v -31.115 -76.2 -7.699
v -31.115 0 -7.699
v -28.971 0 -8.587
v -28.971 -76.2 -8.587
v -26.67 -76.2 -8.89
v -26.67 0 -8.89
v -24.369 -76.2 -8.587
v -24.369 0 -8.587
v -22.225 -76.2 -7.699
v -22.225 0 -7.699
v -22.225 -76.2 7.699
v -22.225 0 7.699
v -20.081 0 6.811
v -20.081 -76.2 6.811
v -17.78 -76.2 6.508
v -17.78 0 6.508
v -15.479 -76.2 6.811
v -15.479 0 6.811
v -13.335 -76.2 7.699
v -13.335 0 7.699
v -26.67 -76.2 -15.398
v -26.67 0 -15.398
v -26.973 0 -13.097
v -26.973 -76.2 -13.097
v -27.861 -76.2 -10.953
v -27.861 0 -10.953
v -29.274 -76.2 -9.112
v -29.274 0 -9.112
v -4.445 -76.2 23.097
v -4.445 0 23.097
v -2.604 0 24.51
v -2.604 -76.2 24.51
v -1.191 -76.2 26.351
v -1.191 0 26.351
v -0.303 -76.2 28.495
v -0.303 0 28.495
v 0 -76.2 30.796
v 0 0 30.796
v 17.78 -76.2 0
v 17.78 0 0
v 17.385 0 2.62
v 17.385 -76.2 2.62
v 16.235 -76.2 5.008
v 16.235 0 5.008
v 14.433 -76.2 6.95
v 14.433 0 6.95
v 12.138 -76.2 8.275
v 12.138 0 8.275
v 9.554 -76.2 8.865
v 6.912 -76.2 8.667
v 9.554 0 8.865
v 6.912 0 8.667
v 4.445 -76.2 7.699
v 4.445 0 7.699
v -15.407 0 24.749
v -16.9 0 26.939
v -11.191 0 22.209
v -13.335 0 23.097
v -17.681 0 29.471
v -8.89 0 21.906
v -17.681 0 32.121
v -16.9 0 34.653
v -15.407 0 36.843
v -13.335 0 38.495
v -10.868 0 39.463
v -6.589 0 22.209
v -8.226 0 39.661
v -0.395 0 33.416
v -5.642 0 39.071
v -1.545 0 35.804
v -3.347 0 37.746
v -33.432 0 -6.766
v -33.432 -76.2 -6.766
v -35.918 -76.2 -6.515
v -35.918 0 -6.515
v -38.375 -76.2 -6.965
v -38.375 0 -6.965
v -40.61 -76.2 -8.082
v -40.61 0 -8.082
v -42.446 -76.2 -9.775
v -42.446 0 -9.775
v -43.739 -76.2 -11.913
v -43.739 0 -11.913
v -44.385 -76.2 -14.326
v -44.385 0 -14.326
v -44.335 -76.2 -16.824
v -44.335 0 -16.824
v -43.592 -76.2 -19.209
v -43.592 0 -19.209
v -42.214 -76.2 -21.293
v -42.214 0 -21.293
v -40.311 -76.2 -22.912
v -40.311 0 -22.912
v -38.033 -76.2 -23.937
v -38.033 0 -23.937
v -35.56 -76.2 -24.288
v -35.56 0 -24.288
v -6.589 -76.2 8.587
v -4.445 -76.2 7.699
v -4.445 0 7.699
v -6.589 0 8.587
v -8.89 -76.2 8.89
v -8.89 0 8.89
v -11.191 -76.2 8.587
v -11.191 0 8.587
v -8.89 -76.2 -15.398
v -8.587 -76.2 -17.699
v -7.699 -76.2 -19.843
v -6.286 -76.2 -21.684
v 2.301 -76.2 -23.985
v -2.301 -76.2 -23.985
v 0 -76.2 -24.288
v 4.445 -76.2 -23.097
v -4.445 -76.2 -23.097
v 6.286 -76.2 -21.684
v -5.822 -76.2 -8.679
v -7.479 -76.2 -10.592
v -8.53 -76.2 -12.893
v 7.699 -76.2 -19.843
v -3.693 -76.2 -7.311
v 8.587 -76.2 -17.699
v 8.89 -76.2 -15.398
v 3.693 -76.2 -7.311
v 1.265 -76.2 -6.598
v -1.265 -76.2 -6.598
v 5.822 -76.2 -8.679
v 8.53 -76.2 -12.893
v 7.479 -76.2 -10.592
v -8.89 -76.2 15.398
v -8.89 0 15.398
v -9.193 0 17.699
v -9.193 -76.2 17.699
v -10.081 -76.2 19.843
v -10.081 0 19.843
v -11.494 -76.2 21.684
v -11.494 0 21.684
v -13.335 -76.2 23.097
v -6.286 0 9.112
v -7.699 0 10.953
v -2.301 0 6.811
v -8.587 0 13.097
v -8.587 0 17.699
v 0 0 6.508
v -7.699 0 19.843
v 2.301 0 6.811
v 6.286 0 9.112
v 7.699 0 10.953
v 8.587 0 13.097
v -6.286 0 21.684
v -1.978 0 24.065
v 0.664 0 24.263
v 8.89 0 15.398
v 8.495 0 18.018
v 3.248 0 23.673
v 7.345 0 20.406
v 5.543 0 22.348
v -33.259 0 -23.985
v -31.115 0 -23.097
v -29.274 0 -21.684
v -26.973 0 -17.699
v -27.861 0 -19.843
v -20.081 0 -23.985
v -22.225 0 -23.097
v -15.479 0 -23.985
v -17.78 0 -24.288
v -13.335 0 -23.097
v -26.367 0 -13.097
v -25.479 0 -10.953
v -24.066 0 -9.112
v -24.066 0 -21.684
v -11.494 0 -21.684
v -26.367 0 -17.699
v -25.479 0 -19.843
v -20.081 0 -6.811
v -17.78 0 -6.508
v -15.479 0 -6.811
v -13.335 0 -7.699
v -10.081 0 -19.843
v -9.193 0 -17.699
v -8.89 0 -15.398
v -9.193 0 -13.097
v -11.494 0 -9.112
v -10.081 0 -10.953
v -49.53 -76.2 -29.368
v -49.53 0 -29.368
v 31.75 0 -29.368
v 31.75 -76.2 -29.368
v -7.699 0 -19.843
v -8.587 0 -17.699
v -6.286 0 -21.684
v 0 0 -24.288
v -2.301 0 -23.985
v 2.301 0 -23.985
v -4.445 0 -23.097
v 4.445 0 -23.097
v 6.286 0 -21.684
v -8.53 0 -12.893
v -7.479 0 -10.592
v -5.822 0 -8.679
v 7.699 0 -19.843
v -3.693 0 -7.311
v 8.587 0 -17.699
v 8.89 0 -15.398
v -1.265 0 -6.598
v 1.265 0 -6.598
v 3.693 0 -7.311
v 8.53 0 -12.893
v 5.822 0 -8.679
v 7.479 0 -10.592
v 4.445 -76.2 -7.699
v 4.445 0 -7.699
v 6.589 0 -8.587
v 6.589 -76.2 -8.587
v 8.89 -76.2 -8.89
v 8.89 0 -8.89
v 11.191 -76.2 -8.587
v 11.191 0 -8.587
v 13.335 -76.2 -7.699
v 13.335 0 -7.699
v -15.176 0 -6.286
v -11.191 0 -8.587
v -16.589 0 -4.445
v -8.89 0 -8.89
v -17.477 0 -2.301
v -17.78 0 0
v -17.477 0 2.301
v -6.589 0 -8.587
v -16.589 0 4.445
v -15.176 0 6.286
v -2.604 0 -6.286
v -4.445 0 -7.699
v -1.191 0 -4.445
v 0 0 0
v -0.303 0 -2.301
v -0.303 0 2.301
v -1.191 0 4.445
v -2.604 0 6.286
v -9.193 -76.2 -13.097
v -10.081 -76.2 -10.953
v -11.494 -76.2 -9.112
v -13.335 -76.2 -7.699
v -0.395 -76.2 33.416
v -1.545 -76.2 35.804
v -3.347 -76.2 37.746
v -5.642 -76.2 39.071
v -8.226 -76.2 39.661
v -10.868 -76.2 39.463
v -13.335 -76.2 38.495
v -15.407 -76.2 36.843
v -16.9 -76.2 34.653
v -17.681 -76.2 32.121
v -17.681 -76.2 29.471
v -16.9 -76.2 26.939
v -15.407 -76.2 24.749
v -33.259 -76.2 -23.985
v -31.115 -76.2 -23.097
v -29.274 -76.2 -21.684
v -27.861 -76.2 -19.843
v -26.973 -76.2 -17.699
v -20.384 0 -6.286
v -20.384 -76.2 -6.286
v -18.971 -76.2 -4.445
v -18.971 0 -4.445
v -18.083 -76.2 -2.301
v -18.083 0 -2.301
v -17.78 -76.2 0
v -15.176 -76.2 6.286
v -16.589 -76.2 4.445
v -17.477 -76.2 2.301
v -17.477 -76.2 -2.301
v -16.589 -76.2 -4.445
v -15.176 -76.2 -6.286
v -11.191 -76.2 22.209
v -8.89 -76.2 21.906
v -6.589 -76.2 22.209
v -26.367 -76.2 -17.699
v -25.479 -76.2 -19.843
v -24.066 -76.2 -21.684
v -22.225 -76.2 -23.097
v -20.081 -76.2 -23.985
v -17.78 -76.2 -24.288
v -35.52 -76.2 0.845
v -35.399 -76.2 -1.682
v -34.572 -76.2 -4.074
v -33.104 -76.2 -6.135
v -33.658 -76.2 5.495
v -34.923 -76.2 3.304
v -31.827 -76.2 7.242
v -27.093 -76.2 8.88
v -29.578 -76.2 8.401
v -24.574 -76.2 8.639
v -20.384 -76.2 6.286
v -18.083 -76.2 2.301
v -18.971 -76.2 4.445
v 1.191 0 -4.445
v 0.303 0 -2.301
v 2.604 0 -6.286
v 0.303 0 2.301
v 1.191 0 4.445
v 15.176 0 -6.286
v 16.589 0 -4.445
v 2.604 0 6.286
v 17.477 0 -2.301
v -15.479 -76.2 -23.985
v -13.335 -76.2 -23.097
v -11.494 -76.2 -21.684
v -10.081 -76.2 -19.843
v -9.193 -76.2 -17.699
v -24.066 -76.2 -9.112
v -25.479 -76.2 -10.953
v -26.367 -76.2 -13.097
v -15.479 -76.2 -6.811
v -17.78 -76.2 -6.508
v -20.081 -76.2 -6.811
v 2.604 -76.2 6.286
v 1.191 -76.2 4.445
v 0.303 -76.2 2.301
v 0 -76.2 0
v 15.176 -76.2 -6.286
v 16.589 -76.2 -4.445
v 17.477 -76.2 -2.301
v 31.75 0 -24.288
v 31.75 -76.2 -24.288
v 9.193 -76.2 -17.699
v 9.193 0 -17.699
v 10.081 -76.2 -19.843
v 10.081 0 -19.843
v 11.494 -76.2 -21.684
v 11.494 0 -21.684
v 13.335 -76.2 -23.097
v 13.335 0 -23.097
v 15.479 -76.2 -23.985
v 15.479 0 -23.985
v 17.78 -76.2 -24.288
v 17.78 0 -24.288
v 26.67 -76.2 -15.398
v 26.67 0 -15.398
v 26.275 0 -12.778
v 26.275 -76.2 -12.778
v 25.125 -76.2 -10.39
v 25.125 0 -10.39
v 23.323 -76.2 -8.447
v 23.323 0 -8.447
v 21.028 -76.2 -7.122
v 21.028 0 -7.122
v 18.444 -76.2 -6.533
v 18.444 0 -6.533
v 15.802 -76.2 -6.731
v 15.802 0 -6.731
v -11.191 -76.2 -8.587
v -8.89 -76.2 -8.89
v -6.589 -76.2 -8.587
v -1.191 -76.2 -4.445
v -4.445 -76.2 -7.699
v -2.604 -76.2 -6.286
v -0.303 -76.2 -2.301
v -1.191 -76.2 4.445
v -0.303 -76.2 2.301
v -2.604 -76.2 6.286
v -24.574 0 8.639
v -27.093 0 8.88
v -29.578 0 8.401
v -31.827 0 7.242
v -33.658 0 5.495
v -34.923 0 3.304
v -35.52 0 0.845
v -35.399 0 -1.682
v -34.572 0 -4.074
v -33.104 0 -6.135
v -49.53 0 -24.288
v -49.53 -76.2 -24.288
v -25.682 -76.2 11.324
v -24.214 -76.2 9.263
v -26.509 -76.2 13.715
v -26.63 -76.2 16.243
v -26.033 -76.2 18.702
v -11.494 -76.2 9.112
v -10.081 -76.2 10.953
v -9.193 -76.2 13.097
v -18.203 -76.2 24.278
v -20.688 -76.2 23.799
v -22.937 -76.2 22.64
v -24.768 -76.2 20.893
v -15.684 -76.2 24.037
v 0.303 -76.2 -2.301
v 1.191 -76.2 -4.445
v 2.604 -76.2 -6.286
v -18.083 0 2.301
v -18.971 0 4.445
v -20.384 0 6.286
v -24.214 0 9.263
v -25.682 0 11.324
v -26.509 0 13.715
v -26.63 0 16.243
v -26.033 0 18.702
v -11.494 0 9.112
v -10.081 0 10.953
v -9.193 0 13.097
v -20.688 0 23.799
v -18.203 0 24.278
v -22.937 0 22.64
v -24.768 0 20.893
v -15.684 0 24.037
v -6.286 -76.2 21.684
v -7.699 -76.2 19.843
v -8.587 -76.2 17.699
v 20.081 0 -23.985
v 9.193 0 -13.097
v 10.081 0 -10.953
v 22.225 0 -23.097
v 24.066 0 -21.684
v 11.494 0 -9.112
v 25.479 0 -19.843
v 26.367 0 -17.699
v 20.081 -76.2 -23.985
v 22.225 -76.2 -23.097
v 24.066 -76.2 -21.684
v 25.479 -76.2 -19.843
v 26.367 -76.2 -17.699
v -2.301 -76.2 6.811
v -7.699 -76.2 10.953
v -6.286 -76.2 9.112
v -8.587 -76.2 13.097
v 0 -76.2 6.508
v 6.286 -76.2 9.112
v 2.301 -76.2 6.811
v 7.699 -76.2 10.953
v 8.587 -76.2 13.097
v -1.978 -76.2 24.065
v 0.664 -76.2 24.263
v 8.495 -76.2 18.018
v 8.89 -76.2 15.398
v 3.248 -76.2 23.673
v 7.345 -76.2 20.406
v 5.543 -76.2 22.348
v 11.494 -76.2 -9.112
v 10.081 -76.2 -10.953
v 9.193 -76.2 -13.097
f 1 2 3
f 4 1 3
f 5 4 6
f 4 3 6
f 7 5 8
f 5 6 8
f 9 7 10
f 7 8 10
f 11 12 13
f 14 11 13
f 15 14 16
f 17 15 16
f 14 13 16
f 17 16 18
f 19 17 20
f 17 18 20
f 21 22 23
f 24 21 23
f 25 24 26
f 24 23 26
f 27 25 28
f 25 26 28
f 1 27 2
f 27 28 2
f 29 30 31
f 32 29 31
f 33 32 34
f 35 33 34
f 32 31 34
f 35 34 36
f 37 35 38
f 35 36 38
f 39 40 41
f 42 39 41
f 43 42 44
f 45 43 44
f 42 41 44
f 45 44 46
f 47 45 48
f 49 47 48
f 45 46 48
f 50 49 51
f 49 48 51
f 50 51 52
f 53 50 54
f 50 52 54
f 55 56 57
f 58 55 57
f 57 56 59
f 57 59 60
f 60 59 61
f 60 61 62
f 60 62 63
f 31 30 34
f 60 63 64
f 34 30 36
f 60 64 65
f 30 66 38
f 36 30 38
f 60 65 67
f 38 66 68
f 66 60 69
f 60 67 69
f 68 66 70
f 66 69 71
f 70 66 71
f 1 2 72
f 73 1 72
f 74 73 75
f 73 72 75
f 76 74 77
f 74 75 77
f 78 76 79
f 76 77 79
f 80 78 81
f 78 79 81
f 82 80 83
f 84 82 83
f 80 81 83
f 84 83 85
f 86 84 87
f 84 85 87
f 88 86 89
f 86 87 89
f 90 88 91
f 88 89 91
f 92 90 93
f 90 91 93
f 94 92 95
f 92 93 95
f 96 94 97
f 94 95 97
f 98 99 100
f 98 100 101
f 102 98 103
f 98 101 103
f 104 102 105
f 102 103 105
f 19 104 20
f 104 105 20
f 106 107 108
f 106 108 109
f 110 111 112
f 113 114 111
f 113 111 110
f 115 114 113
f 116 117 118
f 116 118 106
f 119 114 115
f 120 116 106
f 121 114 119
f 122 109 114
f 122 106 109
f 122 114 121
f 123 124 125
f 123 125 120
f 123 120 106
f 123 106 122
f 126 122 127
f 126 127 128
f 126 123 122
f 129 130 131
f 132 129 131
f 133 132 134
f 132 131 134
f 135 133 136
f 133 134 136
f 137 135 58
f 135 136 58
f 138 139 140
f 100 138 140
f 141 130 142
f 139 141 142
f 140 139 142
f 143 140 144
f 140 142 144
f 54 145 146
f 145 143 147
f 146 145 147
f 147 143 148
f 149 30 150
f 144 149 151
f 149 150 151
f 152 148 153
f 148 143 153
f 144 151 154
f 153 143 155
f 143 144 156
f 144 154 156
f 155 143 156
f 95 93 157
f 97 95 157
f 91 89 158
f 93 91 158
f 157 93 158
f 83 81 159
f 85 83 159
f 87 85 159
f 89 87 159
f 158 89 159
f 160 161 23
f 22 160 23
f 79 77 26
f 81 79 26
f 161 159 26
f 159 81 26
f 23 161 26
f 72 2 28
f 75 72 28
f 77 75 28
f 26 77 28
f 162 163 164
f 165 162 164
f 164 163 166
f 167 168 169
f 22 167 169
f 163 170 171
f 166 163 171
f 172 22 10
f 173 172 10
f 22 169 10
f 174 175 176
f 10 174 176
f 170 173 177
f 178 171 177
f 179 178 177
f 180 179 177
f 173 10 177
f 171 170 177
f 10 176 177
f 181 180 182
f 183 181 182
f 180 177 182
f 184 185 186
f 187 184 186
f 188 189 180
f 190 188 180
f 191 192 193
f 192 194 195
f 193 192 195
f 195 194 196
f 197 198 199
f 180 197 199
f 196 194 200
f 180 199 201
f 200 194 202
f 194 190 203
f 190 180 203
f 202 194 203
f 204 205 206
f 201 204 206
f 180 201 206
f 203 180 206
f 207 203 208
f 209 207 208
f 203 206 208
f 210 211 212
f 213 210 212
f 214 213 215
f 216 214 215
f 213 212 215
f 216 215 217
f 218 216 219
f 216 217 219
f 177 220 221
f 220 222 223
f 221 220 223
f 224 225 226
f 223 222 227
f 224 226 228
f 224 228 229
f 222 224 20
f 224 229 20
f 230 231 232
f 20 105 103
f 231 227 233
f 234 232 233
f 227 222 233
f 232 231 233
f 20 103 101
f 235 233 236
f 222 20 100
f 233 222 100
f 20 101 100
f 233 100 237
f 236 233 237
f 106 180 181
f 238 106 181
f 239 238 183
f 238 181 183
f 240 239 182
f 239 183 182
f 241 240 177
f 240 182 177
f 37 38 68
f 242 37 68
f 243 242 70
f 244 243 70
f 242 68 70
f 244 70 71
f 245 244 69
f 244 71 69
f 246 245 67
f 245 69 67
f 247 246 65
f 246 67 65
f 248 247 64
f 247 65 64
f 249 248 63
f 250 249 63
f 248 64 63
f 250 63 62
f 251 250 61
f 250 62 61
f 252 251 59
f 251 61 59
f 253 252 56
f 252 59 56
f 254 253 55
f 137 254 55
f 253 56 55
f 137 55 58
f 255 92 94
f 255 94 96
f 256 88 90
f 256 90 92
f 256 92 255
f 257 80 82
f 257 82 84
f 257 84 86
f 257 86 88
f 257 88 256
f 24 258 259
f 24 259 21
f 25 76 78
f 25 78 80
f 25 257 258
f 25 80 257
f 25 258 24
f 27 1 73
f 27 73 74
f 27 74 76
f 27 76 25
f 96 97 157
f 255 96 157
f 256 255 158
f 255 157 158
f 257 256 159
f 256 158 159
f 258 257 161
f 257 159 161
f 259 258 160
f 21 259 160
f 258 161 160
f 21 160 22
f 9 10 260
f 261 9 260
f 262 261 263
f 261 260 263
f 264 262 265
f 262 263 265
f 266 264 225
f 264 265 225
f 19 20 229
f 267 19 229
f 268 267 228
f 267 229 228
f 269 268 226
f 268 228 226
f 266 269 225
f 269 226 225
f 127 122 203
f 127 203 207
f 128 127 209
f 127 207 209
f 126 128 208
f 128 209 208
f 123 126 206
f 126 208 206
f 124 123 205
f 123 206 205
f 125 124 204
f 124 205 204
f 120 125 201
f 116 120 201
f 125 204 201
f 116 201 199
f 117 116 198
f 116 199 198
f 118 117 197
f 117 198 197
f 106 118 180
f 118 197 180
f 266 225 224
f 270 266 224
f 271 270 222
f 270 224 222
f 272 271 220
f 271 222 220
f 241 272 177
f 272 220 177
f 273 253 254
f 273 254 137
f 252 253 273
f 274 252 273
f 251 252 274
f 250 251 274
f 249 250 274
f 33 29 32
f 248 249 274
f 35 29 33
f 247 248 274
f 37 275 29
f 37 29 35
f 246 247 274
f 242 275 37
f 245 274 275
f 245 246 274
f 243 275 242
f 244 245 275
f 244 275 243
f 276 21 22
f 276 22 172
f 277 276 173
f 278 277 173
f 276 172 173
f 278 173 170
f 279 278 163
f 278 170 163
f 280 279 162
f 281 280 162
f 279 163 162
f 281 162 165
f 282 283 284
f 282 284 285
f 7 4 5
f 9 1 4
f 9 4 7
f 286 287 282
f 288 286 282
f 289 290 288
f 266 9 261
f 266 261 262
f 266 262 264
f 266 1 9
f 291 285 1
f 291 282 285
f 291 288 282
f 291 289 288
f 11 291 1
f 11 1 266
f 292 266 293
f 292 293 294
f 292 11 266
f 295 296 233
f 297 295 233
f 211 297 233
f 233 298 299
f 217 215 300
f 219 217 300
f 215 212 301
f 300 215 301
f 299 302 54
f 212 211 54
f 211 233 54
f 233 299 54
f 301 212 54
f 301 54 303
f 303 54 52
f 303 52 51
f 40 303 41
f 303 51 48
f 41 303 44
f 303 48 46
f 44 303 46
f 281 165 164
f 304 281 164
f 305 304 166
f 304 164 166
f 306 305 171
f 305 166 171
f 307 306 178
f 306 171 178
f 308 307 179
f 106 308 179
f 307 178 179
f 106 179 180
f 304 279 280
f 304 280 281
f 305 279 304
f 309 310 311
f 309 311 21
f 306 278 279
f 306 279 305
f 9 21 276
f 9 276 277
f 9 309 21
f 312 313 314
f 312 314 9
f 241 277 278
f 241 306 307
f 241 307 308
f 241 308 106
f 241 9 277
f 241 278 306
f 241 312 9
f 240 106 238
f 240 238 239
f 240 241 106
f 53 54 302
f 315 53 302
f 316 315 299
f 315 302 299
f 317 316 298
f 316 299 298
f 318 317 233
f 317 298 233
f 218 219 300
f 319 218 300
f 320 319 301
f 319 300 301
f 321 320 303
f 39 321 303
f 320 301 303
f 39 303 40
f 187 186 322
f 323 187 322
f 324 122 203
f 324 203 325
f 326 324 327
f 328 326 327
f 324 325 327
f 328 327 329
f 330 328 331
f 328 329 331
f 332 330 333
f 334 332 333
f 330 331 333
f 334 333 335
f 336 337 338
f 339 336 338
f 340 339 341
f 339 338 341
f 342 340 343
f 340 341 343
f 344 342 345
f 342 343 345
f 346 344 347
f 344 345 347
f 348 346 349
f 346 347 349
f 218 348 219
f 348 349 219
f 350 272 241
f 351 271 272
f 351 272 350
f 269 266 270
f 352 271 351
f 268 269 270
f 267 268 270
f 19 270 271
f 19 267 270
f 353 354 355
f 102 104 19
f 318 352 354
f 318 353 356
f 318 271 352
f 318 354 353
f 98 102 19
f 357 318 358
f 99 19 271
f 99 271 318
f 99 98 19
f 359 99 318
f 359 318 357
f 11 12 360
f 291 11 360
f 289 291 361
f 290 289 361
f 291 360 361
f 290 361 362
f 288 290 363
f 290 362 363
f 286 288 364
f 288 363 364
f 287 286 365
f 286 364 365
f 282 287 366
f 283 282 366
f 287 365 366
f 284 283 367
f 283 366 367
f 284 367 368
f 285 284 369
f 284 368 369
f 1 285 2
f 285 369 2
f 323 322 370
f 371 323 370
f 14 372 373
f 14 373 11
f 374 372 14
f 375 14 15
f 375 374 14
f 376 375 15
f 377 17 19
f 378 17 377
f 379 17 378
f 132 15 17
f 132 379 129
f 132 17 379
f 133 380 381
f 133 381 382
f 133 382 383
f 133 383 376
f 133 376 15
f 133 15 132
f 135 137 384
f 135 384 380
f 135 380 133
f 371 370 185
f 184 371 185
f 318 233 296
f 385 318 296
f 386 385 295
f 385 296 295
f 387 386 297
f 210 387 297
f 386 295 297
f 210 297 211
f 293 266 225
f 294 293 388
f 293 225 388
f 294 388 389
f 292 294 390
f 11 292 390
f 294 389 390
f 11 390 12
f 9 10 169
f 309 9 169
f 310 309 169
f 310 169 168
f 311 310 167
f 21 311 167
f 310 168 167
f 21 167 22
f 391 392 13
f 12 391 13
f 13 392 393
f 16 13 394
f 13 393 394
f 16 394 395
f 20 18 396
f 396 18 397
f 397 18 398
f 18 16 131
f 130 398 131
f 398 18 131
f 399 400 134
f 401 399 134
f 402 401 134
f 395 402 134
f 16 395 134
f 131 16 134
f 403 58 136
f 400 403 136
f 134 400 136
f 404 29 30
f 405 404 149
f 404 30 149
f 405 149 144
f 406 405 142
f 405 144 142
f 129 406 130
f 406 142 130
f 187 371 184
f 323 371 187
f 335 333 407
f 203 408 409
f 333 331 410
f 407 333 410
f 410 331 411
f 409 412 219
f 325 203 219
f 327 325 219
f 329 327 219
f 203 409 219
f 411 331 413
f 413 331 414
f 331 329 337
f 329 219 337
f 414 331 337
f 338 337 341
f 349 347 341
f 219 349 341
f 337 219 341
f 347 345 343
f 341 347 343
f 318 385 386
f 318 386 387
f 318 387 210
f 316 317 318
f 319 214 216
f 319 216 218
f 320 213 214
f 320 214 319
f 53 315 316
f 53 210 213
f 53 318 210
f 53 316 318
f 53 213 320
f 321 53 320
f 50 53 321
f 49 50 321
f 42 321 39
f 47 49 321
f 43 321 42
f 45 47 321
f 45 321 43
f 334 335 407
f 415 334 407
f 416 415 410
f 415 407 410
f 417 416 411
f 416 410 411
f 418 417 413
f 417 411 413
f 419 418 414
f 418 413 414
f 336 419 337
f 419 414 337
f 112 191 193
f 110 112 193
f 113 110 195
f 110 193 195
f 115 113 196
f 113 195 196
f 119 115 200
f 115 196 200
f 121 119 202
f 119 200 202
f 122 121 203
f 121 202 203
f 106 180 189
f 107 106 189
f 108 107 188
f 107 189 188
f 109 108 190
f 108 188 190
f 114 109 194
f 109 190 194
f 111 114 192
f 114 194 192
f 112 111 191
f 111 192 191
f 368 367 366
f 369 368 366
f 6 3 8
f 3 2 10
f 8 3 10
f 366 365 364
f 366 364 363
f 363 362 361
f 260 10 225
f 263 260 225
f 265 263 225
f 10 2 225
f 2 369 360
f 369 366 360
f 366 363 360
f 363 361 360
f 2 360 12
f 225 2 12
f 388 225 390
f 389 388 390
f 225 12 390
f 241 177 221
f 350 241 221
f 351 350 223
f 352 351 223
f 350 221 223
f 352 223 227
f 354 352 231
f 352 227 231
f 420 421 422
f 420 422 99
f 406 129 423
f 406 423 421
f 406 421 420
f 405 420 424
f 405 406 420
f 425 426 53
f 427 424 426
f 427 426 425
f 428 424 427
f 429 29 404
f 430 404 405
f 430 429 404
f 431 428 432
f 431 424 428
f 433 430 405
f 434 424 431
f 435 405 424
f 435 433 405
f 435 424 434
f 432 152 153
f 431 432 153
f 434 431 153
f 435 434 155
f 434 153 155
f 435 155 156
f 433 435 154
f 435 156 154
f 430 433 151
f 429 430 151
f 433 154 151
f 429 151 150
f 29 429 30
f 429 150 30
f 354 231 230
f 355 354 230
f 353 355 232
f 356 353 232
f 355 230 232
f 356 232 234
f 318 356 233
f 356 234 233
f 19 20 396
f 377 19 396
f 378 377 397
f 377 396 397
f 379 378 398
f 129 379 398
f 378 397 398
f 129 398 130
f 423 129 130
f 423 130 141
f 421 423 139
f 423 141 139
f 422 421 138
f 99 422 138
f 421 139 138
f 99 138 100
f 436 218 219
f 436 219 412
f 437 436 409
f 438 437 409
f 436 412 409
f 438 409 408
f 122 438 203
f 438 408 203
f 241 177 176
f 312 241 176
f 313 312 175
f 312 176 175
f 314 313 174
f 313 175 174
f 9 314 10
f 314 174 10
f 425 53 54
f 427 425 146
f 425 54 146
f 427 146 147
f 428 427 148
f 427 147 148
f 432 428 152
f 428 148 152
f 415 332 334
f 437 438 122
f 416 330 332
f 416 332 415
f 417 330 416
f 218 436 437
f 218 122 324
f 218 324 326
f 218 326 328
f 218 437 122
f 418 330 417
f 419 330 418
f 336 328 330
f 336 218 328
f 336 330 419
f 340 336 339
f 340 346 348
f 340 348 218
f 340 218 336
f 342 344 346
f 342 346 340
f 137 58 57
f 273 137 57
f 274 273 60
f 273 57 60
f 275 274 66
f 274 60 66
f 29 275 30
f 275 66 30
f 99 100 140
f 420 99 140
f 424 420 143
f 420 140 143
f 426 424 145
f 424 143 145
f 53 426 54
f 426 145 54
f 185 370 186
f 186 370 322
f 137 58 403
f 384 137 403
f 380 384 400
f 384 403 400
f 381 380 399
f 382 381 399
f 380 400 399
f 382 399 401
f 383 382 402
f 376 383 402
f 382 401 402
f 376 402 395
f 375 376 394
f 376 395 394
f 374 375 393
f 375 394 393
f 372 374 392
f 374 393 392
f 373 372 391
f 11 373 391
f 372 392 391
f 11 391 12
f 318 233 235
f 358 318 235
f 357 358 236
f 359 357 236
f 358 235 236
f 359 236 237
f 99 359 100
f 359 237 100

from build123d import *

# Parameters (mm, degrees)
F1_DEPTH = 76.2


# Not quite as in the source:
# - a feature names something its author has since deleted; it is built from what else it names


with BuildPart() as f1:
    # F0 (on Front) → F1 (new body)
    with BuildSketch(Plane.XZ):
        with BuildLine():
            ThreePointArc((-22.2250001435, -7.6989659225), (-18.9710342018, -4.4450000718), (-17.78, 0))
            ThreePointArc((-17.78, 0), (-18.9710341832, 4.4450000396), (-22.2250000791, 7.6989658853))
            ThreePointArc((-22.2250000791, 7.6989658853), (-34.3689658613, 4.4449999625), (-31.1150000042, -7.6989658372))
            ThreePointArc((-31.1150000042, -7.6989658372), (-26.6700000853, -8.89), (-22.2250001435, -7.6989659225))
        make_face()
    extrude(amount=F1_DEPTH)


with BuildPart() as f1b:
    # F0 (on Front) → F1, piece 2 (new body)
    with BuildSketch(Plane.XZ):
        with BuildLine():
            ThreePointArc((-13.3350000511, 7.6989658101), (-16.5889658544, 4.4449999744), (-17.78, 0))
            ThreePointArc((-17.78, 0), (-16.5889658625, -4.4449999603), (-13.3350000793, -7.6989657939))
            ThreePointArc((-13.3350000793, -7.6989657939), (-8.8900000289, -8.89), (-4.4449999708, -7.6989658228))
            ThreePointArc((-4.4449999708, -7.6989658228), (-1.1910341519, -4.4449999854), (0, 0))
            ThreePointArc((0, 0), (-1.1910341518, 4.4449999853), (-4.4449999705, 7.6989658226))
            ThreePointArc((-4.4449999705, 7.6989658226), (-8.8900000125, 8.89), (-13.3350000511, 7.6989658101))
        make_face()
    extrude(amount=F1_DEPTH)


with BuildPart() as f1c:
    # F0 (on Front) → F1, piece 3 (new body)
    with BuildSketch(Plane.XZ):
        with BuildLine():
            ThreePointArc((-13.3350001127, 23.096897584), (-25.4789658493, 19.8429316625), (-22.2250000791, 7.6989658853))
            ThreePointArc((-22.2250000791, 7.6989658853), (-17.7800000752, 6.5079316793), (-13.3350000511, 7.6989658101))
            ThreePointArc((-13.3350000511, 7.6989658101), (-10.0810341751, 10.9529316537), (-8.89, 15.3979316793))
            ThreePointArc((-8.89, 15.3979316793), (-10.0810341929, 19.8429317356), (-13.3350001127, 23.096897584))
        make_face()
    extrude(amount=F1_DEPTH)


with BuildPart() as f1d:
    # F0 (on Front) → F1, piece 4 (new body)
    with BuildSketch(Plane.XZ):
        with BuildLine():
            ThreePointArc((-13.3350000793, -7.6989657939), (-17.7800001286, -6.5079316793), (-22.2250001435, -7.6989659225))
            ThreePointArc((-22.2250001435, -7.6989659225), (-25.4789658811, -10.952931751), (-26.67, -15.3979316793))
            ThreePointArc((-26.67, -15.3979316793), (-24.0661792847, -21.684110964), (-17.78, -24.2879316793))
            ThreePointArc((-17.78, -24.2879316793), (-11.4938207153, -21.684110964), (-8.89, -15.3979316793))
            ThreePointArc((-8.89, -15.3979316793), (-10.0810341832, -10.9529316396), (-13.3350000793, -7.6989657939))
        make_face()
    extrude(amount=F1_DEPTH)


with BuildPart() as f1e:
    # F0 (on Front) → F1, piece 5 (new body)
    with BuildSketch(Plane.XZ):
        with BuildLine():
            ThreePointArc((-26.67, -15.3979316793), (-27.8610341616, -10.9529316772), (-31.1150000042, -7.6989658372))
            ThreePointArc((-31.1150000042, -7.6989658372), (-44.1470805963, -13.0970303707), (-35.56, -24.2879316793))
            ThreePointArc((-35.56, -24.2879316793), (-29.2738207153, -21.684110964), (-26.67, -15.3979316793))
        make_face()
    extrude(amount=F1_DEPTH)


with BuildPart() as f1f:
    # F0 (on Front) → F1, piece 6 (new body)
    with BuildSketch(Plane.XZ):
        with BuildLine():
            ThreePointArc((0, 30.7958633586), (-13.3349999436, 38.4948292308), (-13.3350001127, 23.096897584))
            ThreePointArc((-13.3350001127, 23.096897584), (-8.8900000658, 21.9058633586), (-4.4450000013, 23.0968975182))
            ThreePointArc((-4.4450000013, 23.0968975182), (-1.1910341607, 26.3508633579), (0, 30.7958633586))
        make_face()
    extrude(amount=F1_DEPTH)


with BuildPart() as f1g:
    # F0 (on Front) → F1, piece 7 (new body)
    with BuildSketch(Plane.XZ):
        with BuildLine():
            ThreePointArc((-8.89, 15.3979316793), (-7.6989658311, 10.9529316645), (-4.4449999705, 7.6989658226))
            ThreePointArc((-4.4449999705, 7.6989658226), (6.75e-08, 6.5079316793), (4.4450000875, 7.6989658901))
            ThreePointArc((4.4450000875, 7.6989658901), (7.6989658649, 10.952931723), (8.89, 15.3979316793))
            ThreePointArc((8.89, 15.3979316793), (4.4449999993, 23.0968975193), (-4.4450000013, 23.0968975182))
            ThreePointArc((-4.4450000013, 23.0968975182), (-7.69896584, 19.8429316786), (-8.89, 15.3979316793))
        make_face()
    extrude(amount=F1_DEPTH)


with BuildPart() as f1h:
    # F0 (on Front) → F1, piece 8 (new body)
    with BuildSketch(Plane.XZ):
        with BuildLine():
            ThreePointArc((4.4450000013, -7.6989658404), (1.76e-08, -6.5079316793), (-4.4449999708, -7.6989658228))
            ThreePointArc((-4.4449999708, -7.6989658228), (-7.6989658312, -10.9529316647), (-8.89, -15.3979316793))
            ThreePointArc((-8.89, -15.3979316793), (-6.2861793033, -21.6841109454), (-5.26e-08, -24.2879316793))
            ThreePointArc((-5.26e-08, -24.2879316793), (6.2861792662, -21.6841109826), (8.89, -15.3979316793))
            ThreePointArc((8.89, -15.3979316793), (7.69896584, -10.9529316799), (4.4450000013, -7.6989658404))
        make_face()
    extrude(amount=F1_DEPTH)


with BuildPart() as f1i:
    # F0 (on Front) → F1, piece 9 (new body)
    with BuildSketch(Plane.XZ):
        Polygon((-17.78, -24.2879316793), (-35.56, -24.2879316793), (-49.53, -24.2879316793), (-49.53, -29.3679316793), (31.75, -29.3679316793), (31.75, -24.2879316793), (17.7799999808, -24.2879316793), (-5.26e-08, -24.2879316793), align=None)
    extrude(amount=F1_DEPTH)


with BuildPart() as f1j:
    # F0 (on Front) → F1, piece 10 (new body)
    with BuildSketch(Plane.XZ):
        with BuildLine():
            ThreePointArc((4.4450000875, 7.6989658901), (1.1910341856, 4.4450000437), (0, 0))
            ThreePointArc((0, 0), (1.1910341607, -4.4450000007), (4.4450000013, -7.6989658404))
            ThreePointArc((4.4450000013, -7.6989658404), (8.8899999644, -8.89), (13.3349999371, -7.698965876))
            ThreePointArc((13.3349999371, -7.698965876), (16.5889658215, -4.4450000314), (17.78, 0))
            ThreePointArc((17.78, 0), (13.3350000437, 7.6989658144), (4.4450000875, 7.6989658901))
        make_face()
    extrude(amount=F1_DEPTH)


with BuildPart() as f1k:
    # F0 (on Front) → F1, piece 11 (new body)
    with BuildSketch(Plane.XZ):
        with BuildLine():
            ThreePointArc((26.67, -15.3979316793), (22.2249999686, -7.6989658215), (13.3349999371, -7.698965876))
            ThreePointArc((13.3349999371, -7.698965876), (10.0810341422, -10.9529317107), (8.89, -15.3979316793))
            ThreePointArc((8.89, -15.3979316793), (11.4938207085, -21.6841109572), (17.7799999808, -24.2879316793))
            ThreePointArc((17.7799999808, -24.2879316793), (24.066179278, -21.6841109708), (26.67, -15.3979316793))
        make_face()
    extrude(amount=F1_DEPTH)


solid = Compound([f1.part, f1b.part, f1c.part, f1d.part, f1e.part, f1f.part, f1g.part, f1h.part, f1i.part, f1j.part, f1k.part])
